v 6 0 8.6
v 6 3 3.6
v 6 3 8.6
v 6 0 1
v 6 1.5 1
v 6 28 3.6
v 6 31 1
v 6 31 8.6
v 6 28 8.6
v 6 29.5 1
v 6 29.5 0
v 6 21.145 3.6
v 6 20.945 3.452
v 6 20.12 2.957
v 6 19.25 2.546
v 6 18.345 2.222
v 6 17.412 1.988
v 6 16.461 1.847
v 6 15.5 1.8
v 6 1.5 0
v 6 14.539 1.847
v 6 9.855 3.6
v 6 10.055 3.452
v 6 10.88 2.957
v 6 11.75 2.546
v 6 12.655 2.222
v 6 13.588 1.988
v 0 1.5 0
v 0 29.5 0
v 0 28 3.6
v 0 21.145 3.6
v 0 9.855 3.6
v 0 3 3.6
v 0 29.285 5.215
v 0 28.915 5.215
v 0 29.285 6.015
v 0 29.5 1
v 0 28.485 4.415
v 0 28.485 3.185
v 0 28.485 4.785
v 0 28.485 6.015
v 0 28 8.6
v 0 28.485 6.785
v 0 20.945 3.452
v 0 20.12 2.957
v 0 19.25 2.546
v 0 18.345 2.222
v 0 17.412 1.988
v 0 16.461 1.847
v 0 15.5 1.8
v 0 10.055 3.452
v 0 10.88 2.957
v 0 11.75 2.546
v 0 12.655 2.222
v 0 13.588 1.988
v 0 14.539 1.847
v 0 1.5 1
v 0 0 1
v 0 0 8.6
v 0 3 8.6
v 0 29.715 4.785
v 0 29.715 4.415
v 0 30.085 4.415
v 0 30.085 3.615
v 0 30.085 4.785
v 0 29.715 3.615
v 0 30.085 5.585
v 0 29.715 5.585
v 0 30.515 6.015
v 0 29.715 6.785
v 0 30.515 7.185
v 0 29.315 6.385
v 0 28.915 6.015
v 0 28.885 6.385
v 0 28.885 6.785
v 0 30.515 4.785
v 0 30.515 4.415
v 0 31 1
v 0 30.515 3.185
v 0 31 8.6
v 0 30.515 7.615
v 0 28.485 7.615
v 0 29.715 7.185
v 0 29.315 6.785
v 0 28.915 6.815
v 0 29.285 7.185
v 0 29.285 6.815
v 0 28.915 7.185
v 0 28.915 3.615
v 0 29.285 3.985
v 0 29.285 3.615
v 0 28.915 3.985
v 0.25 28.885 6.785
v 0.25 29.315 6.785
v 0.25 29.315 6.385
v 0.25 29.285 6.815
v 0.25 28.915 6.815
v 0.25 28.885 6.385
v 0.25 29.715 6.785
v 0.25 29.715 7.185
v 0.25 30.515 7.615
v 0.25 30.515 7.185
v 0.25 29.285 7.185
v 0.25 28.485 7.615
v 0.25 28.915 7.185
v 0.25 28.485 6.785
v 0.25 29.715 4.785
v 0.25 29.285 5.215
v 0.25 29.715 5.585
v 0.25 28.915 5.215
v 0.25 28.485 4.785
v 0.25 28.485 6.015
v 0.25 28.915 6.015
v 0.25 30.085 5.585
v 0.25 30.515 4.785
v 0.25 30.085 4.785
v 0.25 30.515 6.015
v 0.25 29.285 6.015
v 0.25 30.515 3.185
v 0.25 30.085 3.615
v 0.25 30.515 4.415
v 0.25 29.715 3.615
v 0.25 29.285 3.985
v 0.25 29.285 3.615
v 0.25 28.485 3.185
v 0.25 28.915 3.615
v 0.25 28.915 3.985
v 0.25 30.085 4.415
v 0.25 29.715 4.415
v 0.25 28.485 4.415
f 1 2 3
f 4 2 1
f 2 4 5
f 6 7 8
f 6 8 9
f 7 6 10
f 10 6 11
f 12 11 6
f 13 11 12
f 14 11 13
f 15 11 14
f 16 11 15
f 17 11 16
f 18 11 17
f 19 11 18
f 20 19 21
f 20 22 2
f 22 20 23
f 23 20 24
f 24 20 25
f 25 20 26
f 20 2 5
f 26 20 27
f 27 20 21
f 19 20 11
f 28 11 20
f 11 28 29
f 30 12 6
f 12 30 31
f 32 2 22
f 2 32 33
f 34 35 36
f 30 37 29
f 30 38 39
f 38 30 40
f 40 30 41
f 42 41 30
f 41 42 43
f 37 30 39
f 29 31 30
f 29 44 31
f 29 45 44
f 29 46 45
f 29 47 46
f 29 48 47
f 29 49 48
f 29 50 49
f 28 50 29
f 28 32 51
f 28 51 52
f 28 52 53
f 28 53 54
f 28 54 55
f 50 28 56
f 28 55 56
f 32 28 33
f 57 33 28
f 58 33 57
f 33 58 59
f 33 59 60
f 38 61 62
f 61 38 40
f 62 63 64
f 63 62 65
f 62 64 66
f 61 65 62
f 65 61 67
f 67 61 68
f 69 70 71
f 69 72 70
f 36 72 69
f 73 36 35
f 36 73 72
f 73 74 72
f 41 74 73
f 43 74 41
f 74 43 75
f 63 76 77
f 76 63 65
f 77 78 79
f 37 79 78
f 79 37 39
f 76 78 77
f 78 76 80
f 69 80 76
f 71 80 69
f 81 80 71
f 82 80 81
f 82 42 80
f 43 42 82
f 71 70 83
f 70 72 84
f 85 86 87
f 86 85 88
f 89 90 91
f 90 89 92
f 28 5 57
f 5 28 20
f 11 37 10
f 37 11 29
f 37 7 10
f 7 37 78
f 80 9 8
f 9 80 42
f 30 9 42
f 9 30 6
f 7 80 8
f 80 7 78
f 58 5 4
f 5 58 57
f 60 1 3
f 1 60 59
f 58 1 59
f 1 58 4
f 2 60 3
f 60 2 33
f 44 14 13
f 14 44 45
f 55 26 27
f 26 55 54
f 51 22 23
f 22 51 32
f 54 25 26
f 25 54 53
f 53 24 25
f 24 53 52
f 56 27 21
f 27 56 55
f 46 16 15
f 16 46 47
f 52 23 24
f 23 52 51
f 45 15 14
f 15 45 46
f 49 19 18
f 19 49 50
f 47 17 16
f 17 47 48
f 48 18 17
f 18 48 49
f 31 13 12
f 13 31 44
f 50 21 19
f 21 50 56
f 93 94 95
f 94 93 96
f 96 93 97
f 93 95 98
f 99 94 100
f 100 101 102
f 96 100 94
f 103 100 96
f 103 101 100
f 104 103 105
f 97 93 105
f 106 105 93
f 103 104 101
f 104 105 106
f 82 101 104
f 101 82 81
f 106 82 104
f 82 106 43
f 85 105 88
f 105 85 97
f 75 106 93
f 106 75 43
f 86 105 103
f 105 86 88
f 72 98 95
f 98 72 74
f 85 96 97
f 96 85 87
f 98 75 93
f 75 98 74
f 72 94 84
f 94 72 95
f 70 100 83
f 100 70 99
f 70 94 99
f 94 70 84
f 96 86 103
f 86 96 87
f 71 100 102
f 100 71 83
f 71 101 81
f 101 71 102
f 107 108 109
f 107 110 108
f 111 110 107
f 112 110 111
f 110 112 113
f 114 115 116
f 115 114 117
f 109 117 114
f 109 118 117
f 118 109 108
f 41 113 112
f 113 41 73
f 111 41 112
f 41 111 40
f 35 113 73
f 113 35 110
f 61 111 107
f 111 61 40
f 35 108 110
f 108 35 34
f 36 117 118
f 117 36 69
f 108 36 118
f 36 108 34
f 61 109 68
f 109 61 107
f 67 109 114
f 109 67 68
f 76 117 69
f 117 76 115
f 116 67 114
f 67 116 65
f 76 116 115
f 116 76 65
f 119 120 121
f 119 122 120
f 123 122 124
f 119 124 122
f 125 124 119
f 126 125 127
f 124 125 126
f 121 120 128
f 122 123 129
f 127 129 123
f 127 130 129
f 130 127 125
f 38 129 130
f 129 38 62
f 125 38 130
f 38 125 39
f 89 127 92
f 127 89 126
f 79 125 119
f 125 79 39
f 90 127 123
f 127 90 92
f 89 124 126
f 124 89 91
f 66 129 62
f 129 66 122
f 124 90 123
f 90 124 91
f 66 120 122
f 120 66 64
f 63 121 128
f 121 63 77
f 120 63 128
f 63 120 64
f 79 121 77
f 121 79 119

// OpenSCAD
// 18650電池盒束帶壓扣
$fn=64;
translate([23,70.5,25.6]){rotate([180,0,0]){difference(){difference(){union(){union(){translate([-23,41,22]){cube([6,28,3.6]);}translate([-23,39.5,17]){cube([6,3,7.6]);}}translate([-23,67.5,17]){cube([6,3,7.6]);}}translate([-24,55,14]){rotate([0,90,0]){translate([0,0,0]){cylinder(h=8,d1=19.6,d2=19.6,$fn=64);}}}}multmatrix([[0,0,-1,-23],[0,1,0,41],[1,0,0,20.2],[0,0,0,1]]){union(){union(){union(){union(){union(){union(){union(){union(){union(){union(){union(){union(){union(){union(){union(){union(){union(){union(){union(){union(){union(){union(){union(){union(){union(){union(){union(){union(){union(){union(){translate([-2.215,0.585,-0.25]){cube([0.43,0.43,0.37]);}translate([-1.815,0.585,-0.25]){cube([0.43,0.43,0.37]);}}translate([-2.215,0.185,-0.25]){cube([0.43,0.43,0.37]);}}translate([-1.415,0.185,-0.25]){cube([0.43,0.43,0.37]);}}translate([-2.215,-0.215,-0.25]){cube([0.43,0.43,0.37]);}}translate([-1.815,-0.215,-0.25]){cube([0.43,0.43,0.37]);}}translate([-2.215,-0.615,-0.25]){cube([0.43,0.43,0.37]);}}translate([-2.215,-1.015,-0.25]){cube([0.43,0.43,0.37]);}}translate([-0.615,0.585,-0.25]){cube([0.43,0.43,0.37]);}}translate([-0.215,0.585,-0.25]){cube([0.43,0.43,0.37]);}}translate([0.185,0.585,-0.25]){cube([0.43,0.43,0.37]);}}translate([0.185,0.185,-0.25]){cube([0.43,0.43,0.37]);}}translate([-0.615,-0.215,-0.25]){cube([0.43,0.43,0.37]);}}translate([-0.215,-0.215,-0.25]){cube([0.43,0.43,0.37]);}}translate([0.185,-0.215,-0.25]){cube([0.43,0.43,0.37]);}}translate([-0.615,-0.615,-0.25]){cube([0.43,0.43,0.37]);}}translate([-0.615,-1.015,-0.25]){cube([0.43,0.43,0.37]);}}translate([-0.215,-1.015,-0.25]){cube([0.43,0.43,0.37]);}}translate([0.185,-1.015,-0.25]){cube([0.43,0.43,0.37]);}}translate([0.985,0.585,-0.25]){cube([0.43,0.43,0.37]);}}translate([1.385,0.585,-0.25]){cube([0.43,0.43,0.37]);}}translate([1.785,0.585,-0.25]){cube([0.43,0.43,0.37]);}}translate([0.985,0.185,-0.25]){cube([0.43,0.43,0.37]);}}translate([1.785,0.185,-0.25]){cube([0.43,0.43,0.37]);}}translate([0.985,-0.215,-0.25]){cube([0.43,0.43,0.37]);}}translate([1.385,-0.215,-0.25]){cube([0.43,0.43,0.37]);}}translate([1.785,-0.215,-0.25]){cube([0.43,0.43,0.37]);}}translate([1.785,-0.615,-0.25]){cube([0.43,0.43,0.37]);}}translate([0.985,-1.015,-0.25]){cube([0.43,0.43,0.37]);}}translate([1.385,-1.015,-0.25]){cube([0.43,0.43,0.37]);}}translate([1.785,-1.015,-0.25]){cube([0.43,0.43,0.37]);}}}}}}
